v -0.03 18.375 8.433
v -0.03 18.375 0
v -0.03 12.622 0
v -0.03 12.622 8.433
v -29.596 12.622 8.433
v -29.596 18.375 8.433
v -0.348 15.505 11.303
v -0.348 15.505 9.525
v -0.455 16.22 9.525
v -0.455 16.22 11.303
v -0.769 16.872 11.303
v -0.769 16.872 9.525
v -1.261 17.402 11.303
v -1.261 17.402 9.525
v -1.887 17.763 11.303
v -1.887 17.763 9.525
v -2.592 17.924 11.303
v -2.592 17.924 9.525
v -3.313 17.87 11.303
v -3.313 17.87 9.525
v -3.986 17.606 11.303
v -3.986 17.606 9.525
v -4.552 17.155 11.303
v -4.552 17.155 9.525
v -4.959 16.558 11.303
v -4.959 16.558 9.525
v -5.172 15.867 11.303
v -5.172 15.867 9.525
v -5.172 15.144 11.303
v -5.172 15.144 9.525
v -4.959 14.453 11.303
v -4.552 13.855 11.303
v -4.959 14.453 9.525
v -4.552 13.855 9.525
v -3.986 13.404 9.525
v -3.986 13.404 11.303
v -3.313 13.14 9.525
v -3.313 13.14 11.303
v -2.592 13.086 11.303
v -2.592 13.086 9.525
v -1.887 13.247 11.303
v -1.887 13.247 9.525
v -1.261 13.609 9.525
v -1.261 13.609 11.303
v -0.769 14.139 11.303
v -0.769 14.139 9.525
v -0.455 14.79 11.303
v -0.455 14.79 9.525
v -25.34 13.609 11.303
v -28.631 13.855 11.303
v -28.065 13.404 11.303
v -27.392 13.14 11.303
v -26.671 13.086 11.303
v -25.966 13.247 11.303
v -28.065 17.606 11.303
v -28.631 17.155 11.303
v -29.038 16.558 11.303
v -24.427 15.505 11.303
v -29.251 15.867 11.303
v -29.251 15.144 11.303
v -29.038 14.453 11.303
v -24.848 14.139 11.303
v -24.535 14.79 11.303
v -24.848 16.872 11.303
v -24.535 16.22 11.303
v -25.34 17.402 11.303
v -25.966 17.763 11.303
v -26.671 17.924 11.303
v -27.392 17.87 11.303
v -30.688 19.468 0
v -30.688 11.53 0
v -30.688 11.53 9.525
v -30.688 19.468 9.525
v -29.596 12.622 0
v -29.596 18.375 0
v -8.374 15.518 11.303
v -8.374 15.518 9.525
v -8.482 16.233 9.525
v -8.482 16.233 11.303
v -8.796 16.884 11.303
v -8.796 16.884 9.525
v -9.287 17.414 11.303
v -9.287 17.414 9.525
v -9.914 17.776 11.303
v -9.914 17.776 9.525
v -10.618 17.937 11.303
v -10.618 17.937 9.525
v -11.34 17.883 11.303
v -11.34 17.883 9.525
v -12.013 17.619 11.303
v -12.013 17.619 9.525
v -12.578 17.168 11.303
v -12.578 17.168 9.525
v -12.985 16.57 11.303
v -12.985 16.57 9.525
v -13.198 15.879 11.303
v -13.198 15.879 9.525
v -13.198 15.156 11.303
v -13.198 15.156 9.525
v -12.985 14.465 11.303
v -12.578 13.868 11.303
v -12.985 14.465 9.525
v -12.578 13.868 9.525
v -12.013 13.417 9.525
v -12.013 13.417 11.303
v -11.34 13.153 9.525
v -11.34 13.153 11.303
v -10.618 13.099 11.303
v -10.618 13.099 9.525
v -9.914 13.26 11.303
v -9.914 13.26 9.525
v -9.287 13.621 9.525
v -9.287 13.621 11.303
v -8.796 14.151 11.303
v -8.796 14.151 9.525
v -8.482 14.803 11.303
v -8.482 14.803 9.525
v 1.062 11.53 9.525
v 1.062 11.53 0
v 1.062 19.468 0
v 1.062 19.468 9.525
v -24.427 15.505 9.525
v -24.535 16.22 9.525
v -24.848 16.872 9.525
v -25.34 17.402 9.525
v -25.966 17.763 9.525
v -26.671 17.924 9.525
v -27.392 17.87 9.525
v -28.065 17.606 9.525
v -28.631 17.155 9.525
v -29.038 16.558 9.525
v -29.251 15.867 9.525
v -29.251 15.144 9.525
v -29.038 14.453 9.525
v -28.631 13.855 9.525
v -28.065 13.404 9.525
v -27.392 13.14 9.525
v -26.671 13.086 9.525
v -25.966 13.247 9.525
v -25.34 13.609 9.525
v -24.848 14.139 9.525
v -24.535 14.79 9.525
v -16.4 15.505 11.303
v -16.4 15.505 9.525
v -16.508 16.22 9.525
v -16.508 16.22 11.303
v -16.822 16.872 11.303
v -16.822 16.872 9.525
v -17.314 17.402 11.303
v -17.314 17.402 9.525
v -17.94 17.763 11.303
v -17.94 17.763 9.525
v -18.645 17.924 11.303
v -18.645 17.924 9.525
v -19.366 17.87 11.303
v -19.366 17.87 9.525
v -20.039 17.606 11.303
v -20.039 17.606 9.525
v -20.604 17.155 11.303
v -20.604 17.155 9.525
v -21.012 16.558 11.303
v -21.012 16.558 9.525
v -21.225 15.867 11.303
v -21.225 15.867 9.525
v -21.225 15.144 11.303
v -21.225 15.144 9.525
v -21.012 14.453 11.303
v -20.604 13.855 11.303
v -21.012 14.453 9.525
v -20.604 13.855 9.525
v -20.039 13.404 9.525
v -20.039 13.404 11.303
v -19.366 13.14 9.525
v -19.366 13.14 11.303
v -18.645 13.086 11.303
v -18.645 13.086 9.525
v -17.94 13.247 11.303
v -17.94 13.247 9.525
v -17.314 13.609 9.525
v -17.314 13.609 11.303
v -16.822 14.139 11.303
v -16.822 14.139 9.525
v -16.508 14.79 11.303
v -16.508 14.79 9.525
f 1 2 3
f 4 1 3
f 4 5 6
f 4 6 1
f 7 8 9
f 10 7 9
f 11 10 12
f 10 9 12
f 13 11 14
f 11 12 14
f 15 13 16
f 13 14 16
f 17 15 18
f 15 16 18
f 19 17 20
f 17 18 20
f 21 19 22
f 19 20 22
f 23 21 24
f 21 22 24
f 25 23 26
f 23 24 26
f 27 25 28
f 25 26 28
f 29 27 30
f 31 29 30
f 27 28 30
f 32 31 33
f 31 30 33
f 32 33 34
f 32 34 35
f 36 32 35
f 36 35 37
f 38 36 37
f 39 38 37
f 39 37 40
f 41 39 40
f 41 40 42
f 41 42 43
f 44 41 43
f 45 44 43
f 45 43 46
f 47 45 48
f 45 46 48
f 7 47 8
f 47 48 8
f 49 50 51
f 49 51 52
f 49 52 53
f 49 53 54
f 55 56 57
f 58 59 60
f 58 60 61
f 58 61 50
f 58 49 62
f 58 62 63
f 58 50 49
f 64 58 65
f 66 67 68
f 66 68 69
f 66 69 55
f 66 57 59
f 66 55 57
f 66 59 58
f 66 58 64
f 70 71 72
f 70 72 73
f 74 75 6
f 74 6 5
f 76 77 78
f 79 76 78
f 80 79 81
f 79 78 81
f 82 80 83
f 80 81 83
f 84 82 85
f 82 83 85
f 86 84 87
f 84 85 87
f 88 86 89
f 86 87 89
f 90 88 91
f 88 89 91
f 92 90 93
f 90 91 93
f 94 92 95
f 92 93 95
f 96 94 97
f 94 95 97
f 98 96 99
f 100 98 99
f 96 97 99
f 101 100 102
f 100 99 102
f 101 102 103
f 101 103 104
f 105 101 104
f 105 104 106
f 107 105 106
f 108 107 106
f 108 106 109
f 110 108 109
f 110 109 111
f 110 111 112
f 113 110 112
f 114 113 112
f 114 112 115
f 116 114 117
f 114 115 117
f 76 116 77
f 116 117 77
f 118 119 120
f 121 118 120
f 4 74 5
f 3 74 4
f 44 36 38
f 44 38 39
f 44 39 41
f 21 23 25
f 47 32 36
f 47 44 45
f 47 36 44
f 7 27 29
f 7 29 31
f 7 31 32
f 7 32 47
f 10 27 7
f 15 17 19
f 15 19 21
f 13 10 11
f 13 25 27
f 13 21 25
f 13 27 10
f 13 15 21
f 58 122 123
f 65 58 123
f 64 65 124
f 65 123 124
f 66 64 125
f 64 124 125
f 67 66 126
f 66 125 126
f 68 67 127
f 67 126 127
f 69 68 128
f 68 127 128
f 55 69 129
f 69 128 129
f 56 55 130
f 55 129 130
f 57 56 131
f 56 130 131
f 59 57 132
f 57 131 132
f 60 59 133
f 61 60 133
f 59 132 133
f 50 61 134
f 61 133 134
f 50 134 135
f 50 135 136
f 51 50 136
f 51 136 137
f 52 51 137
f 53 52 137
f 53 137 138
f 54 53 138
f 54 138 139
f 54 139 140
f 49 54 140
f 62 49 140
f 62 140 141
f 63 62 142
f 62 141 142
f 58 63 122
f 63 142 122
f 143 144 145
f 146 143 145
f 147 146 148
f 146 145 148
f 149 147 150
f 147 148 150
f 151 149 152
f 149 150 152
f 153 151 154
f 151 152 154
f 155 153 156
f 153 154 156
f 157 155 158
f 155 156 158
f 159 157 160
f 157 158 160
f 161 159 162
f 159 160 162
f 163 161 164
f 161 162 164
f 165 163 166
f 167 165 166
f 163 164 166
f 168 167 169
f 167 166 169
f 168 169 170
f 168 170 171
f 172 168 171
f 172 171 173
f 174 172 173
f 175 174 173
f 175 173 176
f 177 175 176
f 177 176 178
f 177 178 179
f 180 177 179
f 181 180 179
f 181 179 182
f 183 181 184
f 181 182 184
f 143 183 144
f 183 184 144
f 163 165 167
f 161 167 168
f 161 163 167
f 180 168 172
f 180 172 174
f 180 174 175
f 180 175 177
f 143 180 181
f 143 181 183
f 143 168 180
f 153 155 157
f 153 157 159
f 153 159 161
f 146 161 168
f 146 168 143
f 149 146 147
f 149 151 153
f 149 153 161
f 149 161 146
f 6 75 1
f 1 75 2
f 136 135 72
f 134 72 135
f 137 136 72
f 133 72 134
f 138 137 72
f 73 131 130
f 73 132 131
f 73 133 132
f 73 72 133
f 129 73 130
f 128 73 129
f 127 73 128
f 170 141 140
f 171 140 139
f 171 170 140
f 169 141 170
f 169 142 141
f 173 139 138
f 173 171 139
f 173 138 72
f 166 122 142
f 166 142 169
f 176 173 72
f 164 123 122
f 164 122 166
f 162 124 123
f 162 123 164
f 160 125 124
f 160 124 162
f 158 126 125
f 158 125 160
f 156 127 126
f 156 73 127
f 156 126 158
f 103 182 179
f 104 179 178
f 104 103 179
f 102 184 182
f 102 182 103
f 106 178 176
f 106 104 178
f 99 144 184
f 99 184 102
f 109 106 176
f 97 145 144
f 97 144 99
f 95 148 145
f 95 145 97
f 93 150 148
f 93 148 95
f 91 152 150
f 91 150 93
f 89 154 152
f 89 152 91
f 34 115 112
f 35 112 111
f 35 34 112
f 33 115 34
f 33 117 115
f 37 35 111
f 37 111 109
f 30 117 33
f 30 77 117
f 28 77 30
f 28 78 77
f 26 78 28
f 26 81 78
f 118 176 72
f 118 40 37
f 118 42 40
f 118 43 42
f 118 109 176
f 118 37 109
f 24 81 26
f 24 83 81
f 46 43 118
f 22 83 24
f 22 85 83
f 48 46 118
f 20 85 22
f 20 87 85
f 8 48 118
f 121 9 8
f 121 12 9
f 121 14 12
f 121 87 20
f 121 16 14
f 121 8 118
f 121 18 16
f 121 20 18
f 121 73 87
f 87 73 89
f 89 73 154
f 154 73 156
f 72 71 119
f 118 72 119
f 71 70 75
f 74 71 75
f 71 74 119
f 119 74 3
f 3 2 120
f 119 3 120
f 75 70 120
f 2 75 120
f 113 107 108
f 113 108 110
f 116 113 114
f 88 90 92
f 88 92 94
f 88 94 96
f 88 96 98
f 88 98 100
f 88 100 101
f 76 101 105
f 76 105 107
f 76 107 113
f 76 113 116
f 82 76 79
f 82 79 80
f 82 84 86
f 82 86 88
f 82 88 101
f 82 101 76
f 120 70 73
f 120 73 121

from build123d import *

# Parameters (mm, degrees)
F0_W     = 31.75
F0_H     = 7.9375
F1_DEPTH = 9.525
F2_R     = 2.4257
F3_DEPTH = 1.778
F5_W     = 29.5656
F5_H     = 5.7531
F6_DEPTH = 8.4328


with BuildPart() as f1:
    # F0 (on Top) → F1 (new body)
    with BuildSketch(Plane.XY):
        with Locations((-14.812947, 15.498804)):
            Rectangle(F0_W, F0_H)
    extrude(amount=F1_DEPTH)

    # F2 (on face) → F3 (join)
    with BuildSketch(Plane.XY.offset(9.525)):
        with Locations((-26.852553, 15.505154)):
            Circle(F2_R)
        with Locations((-18.826153, 15.505154)):
            Circle(F2_R)
        with Locations((-10.799753, 15.517854)):
            Circle(F2_R)
        with Locations((-2.773347, 15.505154)):
            Circle(F2_R)
    extrude(amount=F3_DEPTH)

    # F5 (on face) → F6 (cut)
    with BuildSketch(Plane(origin=(0, 0, 0), x_dir=(1, 0, 0), z_dir=(0, 0, -1))):
        with Locations((-14.812947, -15.498804)):
            Rectangle(F5_W, F5_H)
    extrude(amount=-F6_DEPTH, mode=Mode.SUBTRACT)


solid = f1.part
